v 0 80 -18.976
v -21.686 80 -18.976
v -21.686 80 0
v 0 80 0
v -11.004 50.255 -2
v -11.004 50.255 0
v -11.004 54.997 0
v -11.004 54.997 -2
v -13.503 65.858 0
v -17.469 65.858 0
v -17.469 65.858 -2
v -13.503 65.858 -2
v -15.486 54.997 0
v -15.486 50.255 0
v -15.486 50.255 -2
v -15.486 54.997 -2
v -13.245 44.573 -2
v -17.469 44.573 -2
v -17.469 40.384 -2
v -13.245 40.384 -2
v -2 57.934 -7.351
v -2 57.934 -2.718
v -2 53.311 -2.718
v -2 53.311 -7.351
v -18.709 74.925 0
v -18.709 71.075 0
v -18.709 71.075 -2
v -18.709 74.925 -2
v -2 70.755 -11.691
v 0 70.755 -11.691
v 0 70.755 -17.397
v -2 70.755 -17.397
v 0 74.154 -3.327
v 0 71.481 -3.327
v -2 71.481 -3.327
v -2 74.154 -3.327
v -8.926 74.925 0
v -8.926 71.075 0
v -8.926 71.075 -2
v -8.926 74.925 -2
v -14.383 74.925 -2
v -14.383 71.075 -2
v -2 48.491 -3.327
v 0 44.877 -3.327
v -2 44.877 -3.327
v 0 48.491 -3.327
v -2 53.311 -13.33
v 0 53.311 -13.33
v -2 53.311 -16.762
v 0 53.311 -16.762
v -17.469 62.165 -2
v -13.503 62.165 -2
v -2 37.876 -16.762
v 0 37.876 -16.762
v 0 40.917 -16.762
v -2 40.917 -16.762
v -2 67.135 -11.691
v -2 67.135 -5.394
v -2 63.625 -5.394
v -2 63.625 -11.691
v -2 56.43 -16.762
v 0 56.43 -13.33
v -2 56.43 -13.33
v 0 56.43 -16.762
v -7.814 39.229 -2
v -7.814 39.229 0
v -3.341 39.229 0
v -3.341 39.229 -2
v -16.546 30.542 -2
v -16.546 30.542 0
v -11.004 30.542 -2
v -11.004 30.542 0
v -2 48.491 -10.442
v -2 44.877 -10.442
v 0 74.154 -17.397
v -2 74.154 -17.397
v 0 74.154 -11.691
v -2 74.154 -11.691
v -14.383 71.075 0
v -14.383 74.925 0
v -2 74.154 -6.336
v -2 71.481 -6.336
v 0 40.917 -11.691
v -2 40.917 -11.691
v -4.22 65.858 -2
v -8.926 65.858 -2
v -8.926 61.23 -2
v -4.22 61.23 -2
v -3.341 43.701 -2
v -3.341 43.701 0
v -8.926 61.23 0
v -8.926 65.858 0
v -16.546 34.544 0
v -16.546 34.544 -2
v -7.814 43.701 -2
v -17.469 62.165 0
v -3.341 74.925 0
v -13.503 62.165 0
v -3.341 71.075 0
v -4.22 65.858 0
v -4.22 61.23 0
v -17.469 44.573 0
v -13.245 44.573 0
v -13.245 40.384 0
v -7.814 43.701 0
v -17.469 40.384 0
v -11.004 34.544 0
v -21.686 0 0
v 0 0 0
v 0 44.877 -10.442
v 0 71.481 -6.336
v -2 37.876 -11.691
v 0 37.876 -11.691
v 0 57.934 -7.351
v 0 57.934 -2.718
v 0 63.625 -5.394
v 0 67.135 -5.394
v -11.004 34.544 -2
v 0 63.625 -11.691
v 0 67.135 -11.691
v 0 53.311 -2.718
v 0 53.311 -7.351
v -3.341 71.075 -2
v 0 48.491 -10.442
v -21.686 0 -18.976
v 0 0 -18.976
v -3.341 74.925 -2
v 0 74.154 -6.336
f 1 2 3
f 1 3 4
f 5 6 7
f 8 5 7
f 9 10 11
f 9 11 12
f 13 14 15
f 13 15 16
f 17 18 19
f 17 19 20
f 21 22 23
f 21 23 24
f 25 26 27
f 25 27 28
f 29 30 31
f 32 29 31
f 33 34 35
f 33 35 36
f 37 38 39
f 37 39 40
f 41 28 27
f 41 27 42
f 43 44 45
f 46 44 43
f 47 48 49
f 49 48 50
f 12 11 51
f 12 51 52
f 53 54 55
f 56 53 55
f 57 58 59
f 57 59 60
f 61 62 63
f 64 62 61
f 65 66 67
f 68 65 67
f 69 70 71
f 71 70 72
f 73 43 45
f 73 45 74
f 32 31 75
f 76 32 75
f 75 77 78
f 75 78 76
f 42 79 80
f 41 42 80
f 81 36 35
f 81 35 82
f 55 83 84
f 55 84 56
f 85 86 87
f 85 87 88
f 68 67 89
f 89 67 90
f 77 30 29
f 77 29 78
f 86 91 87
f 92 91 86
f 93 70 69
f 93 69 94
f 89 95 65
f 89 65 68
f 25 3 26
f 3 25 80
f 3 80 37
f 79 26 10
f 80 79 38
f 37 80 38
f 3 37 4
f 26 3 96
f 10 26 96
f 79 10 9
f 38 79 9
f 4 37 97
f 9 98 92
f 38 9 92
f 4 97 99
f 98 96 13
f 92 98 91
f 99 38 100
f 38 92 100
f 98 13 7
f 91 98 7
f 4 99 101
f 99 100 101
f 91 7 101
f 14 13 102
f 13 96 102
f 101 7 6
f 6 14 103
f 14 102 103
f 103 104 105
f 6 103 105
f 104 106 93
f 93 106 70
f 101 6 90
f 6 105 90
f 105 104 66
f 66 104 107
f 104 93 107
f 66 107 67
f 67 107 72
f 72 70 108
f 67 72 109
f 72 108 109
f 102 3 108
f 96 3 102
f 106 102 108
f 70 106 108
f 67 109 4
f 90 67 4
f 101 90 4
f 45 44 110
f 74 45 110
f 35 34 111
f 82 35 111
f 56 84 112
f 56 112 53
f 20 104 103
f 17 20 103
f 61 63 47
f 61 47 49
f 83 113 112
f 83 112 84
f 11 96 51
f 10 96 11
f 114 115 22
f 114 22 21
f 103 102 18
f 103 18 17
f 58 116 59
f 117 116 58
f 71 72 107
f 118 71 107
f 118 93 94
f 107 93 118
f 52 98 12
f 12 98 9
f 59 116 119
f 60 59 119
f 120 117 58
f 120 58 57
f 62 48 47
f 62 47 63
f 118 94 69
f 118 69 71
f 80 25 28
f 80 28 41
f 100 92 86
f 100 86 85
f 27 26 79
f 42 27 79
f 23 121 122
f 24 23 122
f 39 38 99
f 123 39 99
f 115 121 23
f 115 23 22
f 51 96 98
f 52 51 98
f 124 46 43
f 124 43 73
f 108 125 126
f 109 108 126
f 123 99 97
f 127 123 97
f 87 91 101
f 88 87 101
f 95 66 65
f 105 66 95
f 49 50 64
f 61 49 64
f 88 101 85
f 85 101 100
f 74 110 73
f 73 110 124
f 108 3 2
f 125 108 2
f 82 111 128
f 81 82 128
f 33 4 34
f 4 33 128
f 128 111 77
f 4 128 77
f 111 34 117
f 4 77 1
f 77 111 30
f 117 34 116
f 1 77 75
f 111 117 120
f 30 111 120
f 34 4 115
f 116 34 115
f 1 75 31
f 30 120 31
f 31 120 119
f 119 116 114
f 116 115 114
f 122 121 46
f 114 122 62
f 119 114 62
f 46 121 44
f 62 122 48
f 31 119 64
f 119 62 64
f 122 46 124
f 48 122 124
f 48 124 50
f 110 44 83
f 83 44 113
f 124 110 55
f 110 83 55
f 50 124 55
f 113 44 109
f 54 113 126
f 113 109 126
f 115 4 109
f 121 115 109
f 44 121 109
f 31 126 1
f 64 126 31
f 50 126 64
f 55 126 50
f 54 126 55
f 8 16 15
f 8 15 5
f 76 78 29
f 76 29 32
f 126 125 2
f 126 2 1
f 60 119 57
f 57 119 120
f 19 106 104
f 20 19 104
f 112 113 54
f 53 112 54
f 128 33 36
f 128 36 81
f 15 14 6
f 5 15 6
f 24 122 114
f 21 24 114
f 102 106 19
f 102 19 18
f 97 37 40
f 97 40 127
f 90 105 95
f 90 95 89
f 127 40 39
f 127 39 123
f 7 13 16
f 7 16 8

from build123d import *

# Parameters (mm, degrees)
SKETCH_2_W          = 21.686450318
SKETCH_2_H          = 18.975644028
EXTRUDE_1_DEPTH     = 80
SKETCH_3_W          = 4.325856272
SKETCH_3_H          = 3.850004403
SKETCH_3_W_2        = 5.584754458
SKETCH_3_W_3        = 3.96682231
SKETCH_3_H_2        = 3.692656783
SKETCH_3_W_4        = 4.705718876
SKETCH_3_H_3        = 4.627145628
SKETCH_3_W_5        = 4.481794252
SKETCH_3_H_4        = 4.742838382
SKETCH_3_W_6        = 4.224308281
SKETCH_3_H_5        = 4.189521493
SKETCH_3_W_7        = 4.472125562
SKETCH_3_H_6        = 4.472586404
SKETCH_3_W_8        = 5.542155091
SKETCH_3_H_7        = 4.001347562
CUT_EXTRUDE_1_DEPTH = 2
SKETCH_4_W          = 3.008522681
SKETCH_4_H          = 2.673197864
SKETCH_4_W_2        = 5.706300448
SKETCH_4_H_2        = 3.399675438
SKETCH_4_W_3        = 6.296507583
SKETCH_4_H_3        = 3.509528199
SKETCH_4_W_4        = 4.633699799
SKETCH_4_H_4        = 4.622885298
SKETCH_4_W_5        = 3.431694386
SKETCH_4_H_5        = 3.11922744
SKETCH_4_W_6        = 7.114178537
SKETCH_4_H_6        = 3.614354853
SKETCH_4_W_7        = 5.071310287
SKETCH_4_H_7        = 3.04134768
CUT_EXTRUDE_2_DEPTH = 2


with BuildPart() as part:
    # Эскиз2 → Бобышка-Вытянуть1 (new body)
    with BuildSketch(Plane(origin=(0, 0, 0), x_dir=(1, 0, 0), z_dir=(0, 1, 0))):
        with Locations((-10.843225159, 9.487822014)):
            Rectangle(SKETCH_2_W, SKETCH_2_H)
    extrude(amount=EXTRUDE_1_DEPTH)

    # Эскиз3 → Вырез-Вытянуть1 (cut)
    with BuildSketch(Plane.XY):
        with Locations((-16.546390401, 73.000252652)):
            Rectangle(SKETCH_3_W, SKETCH_3_H)
        with Locations((-6.133816144, 73.000252652)):
            Rectangle(SKETCH_3_W_2, SKETCH_3_H)
        with Locations((-15.486029562, 64.011252425)):
            Rectangle(SKETCH_3_W_3, SKETCH_3_H_2)
        with Locations((-6.573333935, 63.544008002)):
            Rectangle(SKETCH_3_W_4, SKETCH_3_H_3)
        with Locations((-13.245132436, 52.626011155)):
            Rectangle(SKETCH_3_W_5, SKETCH_3_H_4)
        with Locations((-15.357286577, 42.478535232)):
            Rectangle(SKETCH_3_W_6, SKETCH_3_H_5)
        with Locations((-5.577501696, 41.464970569)):
            Rectangle(SKETCH_3_W_7, SKETCH_3_H_6)
        with Locations((-13.775312856, 32.542849067)):
            Rectangle(SKETCH_3_W_8, SKETCH_3_H_7)
    extrude(amount=-CUT_EXTRUDE_1_DEPTH, mode=Mode.SUBTRACT)

    # Эскиз4 → Вырез-Вытянуть2 (cut)
    with BuildSketch(Plane(origin=(0, 0, 0), x_dir=(0, 0, -1), z_dir=(1, 0, 0))):
        with Locations((4.831613066, 72.817657134)):
            Rectangle(SKETCH_4_W, SKETCH_4_H)
        with Locations((14.543739986, 72.454418347)):
            Rectangle(SKETCH_4_W_2, SKETCH_4_H_2)
        with Locations((8.54233597, 65.380205413)):
            Rectangle(SKETCH_4_W_3, SKETCH_4_H_3)
        with Locations((5.034477327, 55.62228831)):
            Rectangle(SKETCH_4_W_4, SKETCH_4_H_4)
        with Locations((15.046052856, 54.870459381)):
            Rectangle(SKETCH_4_W_5, SKETCH_4_H_5)
        with Locations((6.884440994, 46.683688672)):
            Rectangle(SKETCH_4_W_6, SKETCH_4_H_6)
        with Locations((14.226244905, 39.396398085)):
            Rectangle(SKETCH_4_W_7, SKETCH_4_H_7)
    extrude(amount=-CUT_EXTRUDE_2_DEPTH, mode=Mode.SUBTRACT)


solid = part.part
